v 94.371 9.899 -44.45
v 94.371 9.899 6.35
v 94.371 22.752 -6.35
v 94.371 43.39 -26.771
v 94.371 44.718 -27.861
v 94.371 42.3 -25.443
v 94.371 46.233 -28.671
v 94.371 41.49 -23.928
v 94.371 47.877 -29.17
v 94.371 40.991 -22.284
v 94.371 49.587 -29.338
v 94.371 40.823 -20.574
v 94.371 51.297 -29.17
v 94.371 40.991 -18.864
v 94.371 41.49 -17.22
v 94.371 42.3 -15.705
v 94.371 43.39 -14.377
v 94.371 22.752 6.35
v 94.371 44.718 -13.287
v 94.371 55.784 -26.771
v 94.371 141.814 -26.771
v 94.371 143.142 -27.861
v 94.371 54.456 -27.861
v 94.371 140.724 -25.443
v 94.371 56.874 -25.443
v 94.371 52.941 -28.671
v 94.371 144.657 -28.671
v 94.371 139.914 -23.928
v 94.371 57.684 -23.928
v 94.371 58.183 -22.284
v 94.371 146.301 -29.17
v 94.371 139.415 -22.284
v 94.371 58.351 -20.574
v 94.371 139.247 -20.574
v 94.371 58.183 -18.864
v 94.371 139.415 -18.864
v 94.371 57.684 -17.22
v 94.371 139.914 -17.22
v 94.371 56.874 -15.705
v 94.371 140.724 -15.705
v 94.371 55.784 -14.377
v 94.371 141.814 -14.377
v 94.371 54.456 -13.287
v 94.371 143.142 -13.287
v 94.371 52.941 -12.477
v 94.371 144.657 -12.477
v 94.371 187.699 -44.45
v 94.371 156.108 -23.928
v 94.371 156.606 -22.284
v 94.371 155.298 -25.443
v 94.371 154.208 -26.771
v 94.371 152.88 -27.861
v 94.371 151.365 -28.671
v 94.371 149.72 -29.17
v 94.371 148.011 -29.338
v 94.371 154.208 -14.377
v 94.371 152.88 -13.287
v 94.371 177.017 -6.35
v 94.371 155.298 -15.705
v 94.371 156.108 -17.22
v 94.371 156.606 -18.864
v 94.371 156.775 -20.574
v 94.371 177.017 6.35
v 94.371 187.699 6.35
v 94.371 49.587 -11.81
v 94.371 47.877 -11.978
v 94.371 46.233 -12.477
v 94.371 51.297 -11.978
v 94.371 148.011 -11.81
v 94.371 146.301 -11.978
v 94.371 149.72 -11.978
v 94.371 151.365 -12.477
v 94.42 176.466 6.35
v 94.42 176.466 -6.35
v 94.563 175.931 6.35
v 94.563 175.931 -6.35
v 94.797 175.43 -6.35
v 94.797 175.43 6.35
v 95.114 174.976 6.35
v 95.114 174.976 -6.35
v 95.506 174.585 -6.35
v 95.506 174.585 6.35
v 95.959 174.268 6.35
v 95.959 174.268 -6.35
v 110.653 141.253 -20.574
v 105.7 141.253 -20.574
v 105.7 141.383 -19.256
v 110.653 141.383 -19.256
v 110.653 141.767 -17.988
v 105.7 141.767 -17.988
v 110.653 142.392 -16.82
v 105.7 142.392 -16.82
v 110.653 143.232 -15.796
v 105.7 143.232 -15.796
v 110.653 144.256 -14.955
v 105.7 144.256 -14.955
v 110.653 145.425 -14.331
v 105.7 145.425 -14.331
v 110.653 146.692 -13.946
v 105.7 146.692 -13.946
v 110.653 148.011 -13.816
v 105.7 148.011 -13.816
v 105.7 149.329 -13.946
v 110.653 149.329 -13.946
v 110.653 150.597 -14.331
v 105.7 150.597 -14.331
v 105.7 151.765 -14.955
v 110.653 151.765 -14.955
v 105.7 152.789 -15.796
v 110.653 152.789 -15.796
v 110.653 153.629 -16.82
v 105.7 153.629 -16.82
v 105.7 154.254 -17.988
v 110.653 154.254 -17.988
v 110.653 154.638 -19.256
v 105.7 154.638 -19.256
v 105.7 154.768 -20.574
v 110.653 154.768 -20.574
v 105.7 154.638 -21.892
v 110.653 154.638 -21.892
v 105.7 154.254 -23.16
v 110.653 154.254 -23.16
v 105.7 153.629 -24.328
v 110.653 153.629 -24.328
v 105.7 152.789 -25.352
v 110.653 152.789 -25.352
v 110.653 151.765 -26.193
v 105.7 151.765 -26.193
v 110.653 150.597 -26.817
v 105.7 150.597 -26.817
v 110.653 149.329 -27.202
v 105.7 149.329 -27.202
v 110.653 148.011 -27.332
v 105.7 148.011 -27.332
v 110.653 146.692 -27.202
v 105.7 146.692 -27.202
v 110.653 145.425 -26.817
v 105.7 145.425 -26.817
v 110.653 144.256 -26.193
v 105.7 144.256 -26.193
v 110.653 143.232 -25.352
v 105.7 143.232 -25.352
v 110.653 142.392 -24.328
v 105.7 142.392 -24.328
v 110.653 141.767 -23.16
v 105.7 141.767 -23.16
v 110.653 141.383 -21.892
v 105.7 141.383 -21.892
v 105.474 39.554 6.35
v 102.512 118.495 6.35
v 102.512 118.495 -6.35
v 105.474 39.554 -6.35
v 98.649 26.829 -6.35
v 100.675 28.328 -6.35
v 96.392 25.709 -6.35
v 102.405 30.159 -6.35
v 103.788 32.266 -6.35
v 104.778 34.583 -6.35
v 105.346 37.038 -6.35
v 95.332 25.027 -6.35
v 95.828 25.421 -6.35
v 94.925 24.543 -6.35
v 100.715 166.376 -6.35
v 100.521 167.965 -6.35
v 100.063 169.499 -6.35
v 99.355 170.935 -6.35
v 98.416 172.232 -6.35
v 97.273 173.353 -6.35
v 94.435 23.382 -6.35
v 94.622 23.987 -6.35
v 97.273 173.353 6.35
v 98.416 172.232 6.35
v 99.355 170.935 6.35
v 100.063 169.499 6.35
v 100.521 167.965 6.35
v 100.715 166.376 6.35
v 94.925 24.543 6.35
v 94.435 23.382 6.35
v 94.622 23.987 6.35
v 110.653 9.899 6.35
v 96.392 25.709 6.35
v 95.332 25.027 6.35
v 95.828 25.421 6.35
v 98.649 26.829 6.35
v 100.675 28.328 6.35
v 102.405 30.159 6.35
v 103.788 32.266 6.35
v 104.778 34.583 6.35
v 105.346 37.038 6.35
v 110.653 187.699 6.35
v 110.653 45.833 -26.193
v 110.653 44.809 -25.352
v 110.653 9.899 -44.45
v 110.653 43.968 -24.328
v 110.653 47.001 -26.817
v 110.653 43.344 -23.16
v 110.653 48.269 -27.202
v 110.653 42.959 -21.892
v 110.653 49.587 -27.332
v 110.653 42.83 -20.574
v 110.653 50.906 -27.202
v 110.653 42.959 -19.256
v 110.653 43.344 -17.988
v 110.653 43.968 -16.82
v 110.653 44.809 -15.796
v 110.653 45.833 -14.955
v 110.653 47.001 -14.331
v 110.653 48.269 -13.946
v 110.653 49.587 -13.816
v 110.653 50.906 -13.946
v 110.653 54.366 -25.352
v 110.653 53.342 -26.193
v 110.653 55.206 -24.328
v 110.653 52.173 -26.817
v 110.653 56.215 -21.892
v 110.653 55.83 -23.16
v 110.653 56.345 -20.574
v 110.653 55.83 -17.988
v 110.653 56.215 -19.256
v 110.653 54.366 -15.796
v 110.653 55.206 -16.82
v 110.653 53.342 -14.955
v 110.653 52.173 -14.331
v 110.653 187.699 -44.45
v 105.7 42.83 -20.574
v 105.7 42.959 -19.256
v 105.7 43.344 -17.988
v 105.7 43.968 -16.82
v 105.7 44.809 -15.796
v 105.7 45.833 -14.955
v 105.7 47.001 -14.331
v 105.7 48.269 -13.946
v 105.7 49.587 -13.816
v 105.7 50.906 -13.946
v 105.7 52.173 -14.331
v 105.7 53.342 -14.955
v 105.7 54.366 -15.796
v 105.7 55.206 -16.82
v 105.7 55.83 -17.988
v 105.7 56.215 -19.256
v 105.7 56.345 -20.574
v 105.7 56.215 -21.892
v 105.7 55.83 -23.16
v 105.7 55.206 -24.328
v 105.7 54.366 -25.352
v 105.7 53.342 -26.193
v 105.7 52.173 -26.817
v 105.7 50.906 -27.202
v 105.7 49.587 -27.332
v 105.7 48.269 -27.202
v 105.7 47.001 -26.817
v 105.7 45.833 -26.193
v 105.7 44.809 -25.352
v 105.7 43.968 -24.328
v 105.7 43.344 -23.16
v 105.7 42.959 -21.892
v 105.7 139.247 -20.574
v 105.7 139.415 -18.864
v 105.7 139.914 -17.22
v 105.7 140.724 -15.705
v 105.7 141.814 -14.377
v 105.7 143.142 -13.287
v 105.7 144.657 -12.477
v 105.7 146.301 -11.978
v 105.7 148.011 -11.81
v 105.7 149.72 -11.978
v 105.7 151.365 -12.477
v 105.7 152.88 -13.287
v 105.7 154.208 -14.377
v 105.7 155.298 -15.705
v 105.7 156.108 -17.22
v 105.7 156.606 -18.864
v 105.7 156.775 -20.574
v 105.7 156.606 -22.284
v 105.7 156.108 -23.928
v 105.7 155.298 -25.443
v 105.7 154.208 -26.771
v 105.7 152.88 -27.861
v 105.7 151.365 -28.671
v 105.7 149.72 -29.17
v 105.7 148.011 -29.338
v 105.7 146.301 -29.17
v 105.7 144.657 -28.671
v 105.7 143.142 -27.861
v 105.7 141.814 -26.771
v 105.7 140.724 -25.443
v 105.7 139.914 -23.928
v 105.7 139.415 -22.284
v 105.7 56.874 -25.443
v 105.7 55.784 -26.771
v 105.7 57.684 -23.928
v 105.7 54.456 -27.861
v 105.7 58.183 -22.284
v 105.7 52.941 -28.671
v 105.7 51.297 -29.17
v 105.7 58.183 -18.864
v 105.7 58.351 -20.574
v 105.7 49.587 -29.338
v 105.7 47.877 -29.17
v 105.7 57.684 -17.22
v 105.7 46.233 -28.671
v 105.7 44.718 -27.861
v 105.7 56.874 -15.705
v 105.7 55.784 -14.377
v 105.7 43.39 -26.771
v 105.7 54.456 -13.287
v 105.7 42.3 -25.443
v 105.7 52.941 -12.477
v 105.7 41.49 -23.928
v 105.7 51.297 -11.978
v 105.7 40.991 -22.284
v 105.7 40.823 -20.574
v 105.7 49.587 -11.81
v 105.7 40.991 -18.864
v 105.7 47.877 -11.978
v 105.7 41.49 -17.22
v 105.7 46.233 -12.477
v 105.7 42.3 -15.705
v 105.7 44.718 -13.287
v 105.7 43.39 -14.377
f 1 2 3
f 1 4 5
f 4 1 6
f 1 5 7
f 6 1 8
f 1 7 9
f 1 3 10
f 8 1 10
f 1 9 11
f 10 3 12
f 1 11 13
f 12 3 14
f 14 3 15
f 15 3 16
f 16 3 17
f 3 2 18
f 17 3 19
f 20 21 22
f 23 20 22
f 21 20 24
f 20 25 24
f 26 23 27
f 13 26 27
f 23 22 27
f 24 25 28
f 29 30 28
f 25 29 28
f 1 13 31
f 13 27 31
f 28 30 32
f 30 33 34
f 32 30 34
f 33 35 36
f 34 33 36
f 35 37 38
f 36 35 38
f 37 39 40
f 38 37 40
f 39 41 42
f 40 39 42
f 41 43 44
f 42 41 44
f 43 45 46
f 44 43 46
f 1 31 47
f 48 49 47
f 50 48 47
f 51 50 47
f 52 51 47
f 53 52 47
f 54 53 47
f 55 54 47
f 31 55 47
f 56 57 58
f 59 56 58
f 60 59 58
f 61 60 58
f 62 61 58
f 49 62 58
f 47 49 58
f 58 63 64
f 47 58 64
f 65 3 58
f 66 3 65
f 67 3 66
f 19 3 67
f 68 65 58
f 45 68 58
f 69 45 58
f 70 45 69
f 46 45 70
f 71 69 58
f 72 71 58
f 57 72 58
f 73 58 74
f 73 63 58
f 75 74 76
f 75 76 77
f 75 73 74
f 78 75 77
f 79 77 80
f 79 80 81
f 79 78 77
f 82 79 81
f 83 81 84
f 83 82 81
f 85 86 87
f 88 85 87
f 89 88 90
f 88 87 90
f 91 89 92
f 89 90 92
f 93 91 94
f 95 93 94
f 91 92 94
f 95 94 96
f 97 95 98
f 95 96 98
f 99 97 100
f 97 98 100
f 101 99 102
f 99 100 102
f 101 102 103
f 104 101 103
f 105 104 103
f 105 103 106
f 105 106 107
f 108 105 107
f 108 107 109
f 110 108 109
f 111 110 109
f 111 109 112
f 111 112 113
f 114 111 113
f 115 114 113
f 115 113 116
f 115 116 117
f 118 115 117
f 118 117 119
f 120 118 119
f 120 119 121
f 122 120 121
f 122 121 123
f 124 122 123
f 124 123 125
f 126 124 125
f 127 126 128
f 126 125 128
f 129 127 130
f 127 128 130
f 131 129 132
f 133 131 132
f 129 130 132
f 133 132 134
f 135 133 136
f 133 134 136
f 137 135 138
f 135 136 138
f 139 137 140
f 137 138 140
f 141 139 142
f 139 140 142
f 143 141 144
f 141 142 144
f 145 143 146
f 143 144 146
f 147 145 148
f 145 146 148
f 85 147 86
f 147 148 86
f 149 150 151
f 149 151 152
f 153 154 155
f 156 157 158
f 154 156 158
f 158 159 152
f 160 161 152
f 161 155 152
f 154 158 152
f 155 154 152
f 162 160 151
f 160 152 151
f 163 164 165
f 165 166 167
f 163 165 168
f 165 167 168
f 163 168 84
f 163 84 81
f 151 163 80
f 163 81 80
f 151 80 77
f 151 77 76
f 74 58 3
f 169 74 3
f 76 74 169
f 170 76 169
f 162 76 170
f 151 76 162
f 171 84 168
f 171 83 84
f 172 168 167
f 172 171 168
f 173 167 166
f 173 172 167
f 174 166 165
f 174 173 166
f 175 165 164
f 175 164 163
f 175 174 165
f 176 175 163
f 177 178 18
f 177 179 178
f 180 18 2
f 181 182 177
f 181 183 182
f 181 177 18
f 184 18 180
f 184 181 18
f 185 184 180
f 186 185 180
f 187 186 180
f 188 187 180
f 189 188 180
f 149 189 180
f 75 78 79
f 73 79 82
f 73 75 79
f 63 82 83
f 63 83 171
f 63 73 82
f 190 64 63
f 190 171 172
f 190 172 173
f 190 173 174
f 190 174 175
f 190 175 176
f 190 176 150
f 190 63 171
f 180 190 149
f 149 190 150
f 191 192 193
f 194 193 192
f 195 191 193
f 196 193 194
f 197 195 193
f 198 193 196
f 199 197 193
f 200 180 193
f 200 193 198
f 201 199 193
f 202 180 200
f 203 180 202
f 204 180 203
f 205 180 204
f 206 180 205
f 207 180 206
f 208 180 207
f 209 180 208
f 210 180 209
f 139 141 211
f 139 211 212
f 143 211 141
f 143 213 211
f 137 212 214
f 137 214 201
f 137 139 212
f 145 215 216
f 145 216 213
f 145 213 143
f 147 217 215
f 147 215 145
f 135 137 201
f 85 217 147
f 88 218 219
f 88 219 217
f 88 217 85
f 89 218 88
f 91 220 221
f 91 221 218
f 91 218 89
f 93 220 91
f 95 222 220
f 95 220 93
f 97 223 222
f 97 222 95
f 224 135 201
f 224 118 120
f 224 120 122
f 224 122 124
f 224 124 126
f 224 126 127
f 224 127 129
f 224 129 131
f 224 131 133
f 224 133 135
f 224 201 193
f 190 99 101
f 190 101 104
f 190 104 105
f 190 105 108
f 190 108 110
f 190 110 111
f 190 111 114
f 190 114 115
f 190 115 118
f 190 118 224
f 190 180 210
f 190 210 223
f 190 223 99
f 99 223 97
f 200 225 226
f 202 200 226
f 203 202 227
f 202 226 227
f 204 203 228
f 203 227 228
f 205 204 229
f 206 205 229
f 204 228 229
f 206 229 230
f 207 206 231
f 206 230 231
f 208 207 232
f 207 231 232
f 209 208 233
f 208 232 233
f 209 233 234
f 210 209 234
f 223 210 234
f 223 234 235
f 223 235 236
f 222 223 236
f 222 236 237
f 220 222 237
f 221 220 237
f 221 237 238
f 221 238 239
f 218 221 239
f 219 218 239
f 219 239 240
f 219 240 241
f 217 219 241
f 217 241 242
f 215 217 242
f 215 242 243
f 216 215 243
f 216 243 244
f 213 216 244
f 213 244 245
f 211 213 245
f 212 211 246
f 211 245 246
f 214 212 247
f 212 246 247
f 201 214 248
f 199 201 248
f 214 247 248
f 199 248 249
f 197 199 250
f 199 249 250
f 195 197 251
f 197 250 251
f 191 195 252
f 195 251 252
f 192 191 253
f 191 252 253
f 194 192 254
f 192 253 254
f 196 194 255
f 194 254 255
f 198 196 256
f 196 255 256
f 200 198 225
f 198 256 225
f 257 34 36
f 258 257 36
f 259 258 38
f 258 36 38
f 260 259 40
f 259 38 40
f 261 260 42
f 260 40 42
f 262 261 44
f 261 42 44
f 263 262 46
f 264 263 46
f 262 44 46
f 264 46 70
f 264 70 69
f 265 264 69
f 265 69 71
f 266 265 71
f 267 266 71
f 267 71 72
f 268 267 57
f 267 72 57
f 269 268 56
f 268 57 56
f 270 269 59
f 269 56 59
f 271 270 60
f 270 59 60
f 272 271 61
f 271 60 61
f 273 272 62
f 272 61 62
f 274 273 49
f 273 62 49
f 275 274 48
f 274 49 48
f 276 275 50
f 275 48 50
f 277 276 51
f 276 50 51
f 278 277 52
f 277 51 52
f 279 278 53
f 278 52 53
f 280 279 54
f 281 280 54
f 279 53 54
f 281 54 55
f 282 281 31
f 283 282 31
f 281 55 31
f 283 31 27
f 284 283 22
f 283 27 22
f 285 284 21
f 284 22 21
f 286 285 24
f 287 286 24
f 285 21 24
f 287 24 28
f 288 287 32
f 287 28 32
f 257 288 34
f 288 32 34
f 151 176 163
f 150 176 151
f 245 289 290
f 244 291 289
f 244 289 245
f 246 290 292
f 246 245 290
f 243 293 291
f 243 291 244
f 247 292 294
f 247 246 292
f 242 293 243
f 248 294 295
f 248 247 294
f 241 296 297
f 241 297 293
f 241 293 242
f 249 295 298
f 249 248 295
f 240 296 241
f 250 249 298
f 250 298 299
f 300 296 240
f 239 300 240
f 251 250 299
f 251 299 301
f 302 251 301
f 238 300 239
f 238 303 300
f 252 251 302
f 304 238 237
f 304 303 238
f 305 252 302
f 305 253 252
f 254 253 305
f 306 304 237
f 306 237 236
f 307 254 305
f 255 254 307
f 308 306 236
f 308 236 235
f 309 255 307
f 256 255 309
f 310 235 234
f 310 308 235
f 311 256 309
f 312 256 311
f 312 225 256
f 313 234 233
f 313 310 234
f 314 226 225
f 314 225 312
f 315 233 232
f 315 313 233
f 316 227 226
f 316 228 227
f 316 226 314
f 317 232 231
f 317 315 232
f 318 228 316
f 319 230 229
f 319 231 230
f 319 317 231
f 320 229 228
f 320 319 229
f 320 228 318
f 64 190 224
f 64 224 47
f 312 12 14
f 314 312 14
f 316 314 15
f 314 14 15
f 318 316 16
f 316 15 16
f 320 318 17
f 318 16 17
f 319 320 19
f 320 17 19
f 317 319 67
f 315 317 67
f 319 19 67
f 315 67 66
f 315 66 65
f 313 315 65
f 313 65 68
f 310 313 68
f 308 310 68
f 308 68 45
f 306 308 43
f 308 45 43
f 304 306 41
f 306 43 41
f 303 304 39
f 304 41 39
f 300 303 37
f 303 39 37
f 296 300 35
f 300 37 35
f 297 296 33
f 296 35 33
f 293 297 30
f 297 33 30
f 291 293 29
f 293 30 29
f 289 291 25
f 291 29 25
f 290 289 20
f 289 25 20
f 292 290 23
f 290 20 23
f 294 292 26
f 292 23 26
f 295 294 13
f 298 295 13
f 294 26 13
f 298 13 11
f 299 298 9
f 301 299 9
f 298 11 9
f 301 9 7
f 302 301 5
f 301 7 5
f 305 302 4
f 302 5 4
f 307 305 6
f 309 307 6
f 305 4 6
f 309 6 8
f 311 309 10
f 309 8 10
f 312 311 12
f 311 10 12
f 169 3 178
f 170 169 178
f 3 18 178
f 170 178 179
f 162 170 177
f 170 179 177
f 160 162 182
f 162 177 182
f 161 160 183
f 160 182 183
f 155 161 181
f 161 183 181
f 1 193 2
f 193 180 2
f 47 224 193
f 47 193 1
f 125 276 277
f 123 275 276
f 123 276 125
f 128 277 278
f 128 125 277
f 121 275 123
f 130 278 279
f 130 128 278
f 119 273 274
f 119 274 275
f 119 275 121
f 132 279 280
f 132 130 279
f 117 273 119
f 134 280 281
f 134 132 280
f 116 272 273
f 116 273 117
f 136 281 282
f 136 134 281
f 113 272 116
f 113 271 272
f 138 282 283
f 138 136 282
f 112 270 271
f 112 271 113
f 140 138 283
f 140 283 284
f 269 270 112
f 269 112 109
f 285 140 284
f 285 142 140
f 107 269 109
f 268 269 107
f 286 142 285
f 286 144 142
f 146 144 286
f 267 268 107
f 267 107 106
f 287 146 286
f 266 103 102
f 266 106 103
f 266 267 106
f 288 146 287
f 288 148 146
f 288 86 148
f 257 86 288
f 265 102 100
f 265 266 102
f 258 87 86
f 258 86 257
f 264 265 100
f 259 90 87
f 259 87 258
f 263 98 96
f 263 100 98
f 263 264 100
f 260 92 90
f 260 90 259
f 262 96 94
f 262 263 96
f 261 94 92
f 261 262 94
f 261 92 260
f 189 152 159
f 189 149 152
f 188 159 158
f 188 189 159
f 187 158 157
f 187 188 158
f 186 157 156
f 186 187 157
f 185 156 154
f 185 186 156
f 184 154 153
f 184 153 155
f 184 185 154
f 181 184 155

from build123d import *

# Parameters (mm, degrees)
BOSS_EXTRUDE1_DEPTH = 6.35
SKETCH3_W           = 16.2814
SKETCH3_H           = 177.8
BOSS_EXTRUDE2_DEPTH = 38.1
SKETCH5_R           = 6.75767
CUT_EXTRUDE1_DEPTH  = 194.57627713
SKETCH6_R           = 8.7641176
CUT_EXTRUDE2_DEPTH  = 11.3284
FILLET1_R           = 3.175


with BuildPart() as part:
    # Sketch1 → Boss-Extrude1 (new, symmetric)
    with BuildSketch(Plane.XY):
        with BuildLine():
            Line((110.652882407, 187.698930688), (94.371482407, 187.698930688))
            Line((94.371482407, 187.698930688), (94.371482407, 174.998930688))
            ThreePointArc((94.371482407, 174.998930688), (98.86911538, 171.662815624), (100.714782785, 166.375862067))
            Line((100.714782785, 166.375862067), (102.511582984, 118.494891962))
            Line((102.511582984, 118.494891962), (105.473932974, 39.554455817))
            ThreePointArc((105.473932974, 39.554455817), (102.530659302, 30.319876353), (94.371482407, 25.088418602))
            Line((94.371482407, 25.088418602), (94.371482407, 9.898930688))
            Line((94.371482407, 9.898930688), (110.652882407, 9.898930688))
            Line((110.652882407, 9.898930688), (110.652882407, 187.698930688))
        make_face()
    extrude(amount=BOSS_EXTRUDE1_DEPTH, both=True)

    # Sketch3 → Boss-Extrude2 (add)
    with BuildSketch(Plane(origin=(0, 0, -6.35), x_dir=(-1, 0, 0), z_dir=(0, 0, -1))):
        with Locations((-102.512182407, 98.798930688)):
            Rectangle(SKETCH3_W, SKETCH3_H)
    extrude(amount=BOSS_EXTRUDE2_DEPTH)

    # Sketch5 → Cut-Extrude1 (cut, through all)
    with BuildSketch(Plane.ZY.offset(-94.371482407)):
        with Locations(Location((-20.574, 148.010668688, 0), (0, 0, 270))):
            Circle(SKETCH5_R)
        with Locations(Location((-20.574, 49.587192688, 0), (0, 0, 270))):
            Circle(SKETCH5_R)
    extrude(amount=-CUT_EXTRUDE1_DEPTH, mode=Mode.SUBTRACT)

    # Sketch6 → Cut-Extrude2 (cut)
    with BuildSketch(Plane.ZY.offset(-94.371482407)):
        with Locations(Location((-20.574, 148.010668688, 0), (0, 0, 270))):
            Circle(SKETCH6_R)
        with Locations(Location((-20.574, 49.587192688, 0), (0, 0, 270))):
            Circle(SKETCH6_R)
    extrude(amount=-CUT_EXTRUDE2_DEPTH, mode=Mode.SUBTRACT)

    # Fillet1
    fillet1_edges = [part.edges().sort_by_distance(p)[0] for p in [
        (94.371482407, 25.088418602, 0),
        (94.371482407, 174.998930688, 0),
    ]]
    fillet(fillet1_edges, radius=FILLET1_R)


solid = part.part
